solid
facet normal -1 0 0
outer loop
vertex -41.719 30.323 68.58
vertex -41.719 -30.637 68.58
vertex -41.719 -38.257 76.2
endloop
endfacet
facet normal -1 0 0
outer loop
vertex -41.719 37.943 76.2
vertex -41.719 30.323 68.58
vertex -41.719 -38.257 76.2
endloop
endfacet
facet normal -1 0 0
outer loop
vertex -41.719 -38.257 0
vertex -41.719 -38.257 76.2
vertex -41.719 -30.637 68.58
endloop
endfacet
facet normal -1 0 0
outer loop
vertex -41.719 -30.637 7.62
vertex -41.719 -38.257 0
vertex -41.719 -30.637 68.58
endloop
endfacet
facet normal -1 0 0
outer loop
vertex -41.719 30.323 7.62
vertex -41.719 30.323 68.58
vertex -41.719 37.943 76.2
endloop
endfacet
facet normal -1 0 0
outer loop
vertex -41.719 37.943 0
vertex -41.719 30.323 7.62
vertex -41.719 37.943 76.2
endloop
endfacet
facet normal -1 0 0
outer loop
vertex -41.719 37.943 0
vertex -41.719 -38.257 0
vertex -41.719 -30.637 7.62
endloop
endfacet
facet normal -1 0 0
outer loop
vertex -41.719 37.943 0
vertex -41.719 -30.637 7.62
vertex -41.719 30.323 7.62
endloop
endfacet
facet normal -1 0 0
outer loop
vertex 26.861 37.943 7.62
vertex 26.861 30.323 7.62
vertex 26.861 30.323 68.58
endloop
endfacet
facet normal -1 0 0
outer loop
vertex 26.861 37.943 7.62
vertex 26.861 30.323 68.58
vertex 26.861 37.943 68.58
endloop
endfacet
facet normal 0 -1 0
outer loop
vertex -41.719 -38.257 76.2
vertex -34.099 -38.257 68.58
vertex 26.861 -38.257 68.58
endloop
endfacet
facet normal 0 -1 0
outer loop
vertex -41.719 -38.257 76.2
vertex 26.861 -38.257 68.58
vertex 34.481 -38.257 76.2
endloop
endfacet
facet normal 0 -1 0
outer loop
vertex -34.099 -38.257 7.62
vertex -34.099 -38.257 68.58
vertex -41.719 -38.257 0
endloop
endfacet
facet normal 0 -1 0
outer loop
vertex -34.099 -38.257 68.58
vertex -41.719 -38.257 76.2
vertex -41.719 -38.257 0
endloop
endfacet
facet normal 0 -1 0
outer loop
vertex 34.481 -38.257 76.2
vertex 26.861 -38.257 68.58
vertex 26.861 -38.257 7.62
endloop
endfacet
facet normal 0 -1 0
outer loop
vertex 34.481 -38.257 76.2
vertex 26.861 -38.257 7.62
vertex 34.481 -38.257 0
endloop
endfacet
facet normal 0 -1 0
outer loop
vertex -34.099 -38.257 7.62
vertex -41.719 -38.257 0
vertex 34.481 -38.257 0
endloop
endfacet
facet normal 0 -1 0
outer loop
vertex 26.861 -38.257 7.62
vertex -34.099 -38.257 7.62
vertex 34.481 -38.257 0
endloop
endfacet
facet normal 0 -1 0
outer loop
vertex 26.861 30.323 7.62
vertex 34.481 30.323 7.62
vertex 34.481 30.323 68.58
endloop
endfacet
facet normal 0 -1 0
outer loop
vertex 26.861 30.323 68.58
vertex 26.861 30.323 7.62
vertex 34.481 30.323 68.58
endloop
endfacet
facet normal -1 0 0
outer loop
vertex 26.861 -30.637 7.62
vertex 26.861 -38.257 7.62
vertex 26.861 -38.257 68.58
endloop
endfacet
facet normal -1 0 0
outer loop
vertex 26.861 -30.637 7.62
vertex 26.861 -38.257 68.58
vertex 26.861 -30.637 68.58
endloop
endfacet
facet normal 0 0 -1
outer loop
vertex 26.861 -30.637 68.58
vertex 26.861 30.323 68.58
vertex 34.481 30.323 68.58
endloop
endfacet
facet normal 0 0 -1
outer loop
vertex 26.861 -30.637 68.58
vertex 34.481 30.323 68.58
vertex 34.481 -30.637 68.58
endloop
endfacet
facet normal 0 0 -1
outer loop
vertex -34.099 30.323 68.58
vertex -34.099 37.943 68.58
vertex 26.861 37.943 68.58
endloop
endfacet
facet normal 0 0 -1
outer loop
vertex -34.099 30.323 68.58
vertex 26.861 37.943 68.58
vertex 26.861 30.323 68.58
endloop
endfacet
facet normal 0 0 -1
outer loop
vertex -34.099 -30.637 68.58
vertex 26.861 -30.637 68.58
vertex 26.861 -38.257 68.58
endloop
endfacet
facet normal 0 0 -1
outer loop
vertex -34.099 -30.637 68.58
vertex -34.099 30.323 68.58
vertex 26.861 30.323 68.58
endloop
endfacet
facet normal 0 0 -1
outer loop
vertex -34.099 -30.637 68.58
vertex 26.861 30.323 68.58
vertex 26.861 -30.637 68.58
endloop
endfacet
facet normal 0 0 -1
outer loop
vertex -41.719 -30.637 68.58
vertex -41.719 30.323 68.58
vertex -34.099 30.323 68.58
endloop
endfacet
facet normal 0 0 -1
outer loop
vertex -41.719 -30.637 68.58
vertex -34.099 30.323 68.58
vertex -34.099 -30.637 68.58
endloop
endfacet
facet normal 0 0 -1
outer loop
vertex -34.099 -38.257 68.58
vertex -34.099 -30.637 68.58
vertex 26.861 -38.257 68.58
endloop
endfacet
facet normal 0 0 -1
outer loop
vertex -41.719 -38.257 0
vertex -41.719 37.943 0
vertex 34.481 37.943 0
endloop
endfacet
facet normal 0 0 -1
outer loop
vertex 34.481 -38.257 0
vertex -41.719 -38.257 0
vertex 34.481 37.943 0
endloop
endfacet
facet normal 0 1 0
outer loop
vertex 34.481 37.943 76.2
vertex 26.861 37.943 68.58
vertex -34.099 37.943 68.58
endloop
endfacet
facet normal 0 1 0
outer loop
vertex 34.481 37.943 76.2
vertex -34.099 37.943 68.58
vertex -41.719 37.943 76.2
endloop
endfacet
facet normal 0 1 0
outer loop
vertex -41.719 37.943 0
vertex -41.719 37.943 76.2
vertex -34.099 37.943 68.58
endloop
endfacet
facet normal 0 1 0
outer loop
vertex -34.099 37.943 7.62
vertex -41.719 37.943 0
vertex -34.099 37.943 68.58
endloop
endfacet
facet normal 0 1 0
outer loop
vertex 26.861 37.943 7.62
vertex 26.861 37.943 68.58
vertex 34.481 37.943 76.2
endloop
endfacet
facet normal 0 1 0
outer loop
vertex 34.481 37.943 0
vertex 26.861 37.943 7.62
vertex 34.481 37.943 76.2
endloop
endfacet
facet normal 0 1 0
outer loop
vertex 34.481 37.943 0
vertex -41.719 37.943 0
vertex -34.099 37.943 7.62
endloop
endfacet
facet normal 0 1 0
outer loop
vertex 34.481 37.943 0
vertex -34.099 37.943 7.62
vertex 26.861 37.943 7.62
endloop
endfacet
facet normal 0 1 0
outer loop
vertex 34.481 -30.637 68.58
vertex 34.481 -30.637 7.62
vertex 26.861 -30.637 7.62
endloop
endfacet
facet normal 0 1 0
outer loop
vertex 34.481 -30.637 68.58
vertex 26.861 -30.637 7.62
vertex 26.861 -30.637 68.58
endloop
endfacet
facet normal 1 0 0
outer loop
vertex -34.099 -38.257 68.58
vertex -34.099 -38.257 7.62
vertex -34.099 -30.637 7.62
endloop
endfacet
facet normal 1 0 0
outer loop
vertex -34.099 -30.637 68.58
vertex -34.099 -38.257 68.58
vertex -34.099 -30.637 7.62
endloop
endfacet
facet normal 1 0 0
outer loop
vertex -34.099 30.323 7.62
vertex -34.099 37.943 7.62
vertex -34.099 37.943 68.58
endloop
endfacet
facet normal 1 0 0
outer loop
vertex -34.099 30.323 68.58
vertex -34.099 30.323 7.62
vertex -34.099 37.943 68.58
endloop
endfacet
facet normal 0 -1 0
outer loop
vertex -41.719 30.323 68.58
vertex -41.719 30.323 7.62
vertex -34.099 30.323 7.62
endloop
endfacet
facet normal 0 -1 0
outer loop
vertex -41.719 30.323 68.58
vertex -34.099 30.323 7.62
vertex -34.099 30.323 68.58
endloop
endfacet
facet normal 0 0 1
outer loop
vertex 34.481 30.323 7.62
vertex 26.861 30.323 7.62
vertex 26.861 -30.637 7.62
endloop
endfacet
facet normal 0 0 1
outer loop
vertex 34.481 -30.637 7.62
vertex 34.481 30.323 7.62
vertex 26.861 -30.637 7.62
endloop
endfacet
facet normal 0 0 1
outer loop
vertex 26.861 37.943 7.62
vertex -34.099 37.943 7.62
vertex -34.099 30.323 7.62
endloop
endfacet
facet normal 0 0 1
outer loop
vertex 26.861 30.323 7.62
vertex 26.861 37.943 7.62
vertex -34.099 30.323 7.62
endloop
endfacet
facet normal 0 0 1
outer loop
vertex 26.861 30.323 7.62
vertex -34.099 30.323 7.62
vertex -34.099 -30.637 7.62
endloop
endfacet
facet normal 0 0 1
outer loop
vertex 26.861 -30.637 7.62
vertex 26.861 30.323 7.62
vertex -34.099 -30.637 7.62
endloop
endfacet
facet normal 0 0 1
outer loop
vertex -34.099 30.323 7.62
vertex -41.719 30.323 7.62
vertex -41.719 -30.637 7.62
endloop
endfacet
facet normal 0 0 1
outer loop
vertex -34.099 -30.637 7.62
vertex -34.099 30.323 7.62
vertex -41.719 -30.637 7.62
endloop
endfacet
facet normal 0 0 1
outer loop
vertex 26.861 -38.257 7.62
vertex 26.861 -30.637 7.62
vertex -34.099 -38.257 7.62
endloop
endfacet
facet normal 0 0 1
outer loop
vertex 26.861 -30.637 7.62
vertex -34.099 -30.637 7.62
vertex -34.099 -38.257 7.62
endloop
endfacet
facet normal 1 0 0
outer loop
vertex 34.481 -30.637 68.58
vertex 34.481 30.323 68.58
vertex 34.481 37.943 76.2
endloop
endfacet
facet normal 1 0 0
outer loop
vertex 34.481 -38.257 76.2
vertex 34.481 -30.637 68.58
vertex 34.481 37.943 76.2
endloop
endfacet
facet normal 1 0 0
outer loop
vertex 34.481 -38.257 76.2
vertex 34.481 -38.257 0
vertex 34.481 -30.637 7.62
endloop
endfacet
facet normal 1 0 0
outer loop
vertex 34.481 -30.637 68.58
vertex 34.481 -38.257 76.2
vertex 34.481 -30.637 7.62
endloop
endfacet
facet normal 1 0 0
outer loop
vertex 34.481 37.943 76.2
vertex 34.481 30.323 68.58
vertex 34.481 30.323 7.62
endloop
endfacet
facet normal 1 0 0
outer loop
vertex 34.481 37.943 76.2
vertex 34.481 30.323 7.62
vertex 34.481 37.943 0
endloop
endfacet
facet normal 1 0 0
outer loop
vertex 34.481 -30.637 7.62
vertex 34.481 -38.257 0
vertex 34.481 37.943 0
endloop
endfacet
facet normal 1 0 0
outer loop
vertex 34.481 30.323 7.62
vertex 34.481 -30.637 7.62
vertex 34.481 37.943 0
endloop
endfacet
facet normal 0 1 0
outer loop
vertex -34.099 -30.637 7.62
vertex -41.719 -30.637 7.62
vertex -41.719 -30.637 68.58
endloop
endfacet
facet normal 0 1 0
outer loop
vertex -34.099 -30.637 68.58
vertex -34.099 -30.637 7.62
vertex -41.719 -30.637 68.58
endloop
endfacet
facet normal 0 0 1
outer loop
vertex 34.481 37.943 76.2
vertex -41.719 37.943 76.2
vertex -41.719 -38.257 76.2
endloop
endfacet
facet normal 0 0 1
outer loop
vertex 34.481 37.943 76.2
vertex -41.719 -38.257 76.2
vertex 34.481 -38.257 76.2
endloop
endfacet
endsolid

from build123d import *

# Parameters (mm, degrees)
F0_W     = 76.2
F0_H     = 76.2
F1_DEPTH = 76.2
F2_T     = -7.62
F3_W     = 60.96
F3_H     = 60.96
F4_DEPTH = 25.4
F5_W     = 60.96
F5_H     = 60.96
F6_DEPTH = 25.4
F7_W     = 60.96
F7_H     = 60.96
F8_DEPTH = 25.4


with BuildPart() as f1:
    # F0 (on Top) → F1 (new body)
    with BuildSketch(Plane.XY):
        with Locations((-3.61854, -0.157197)):
            Rectangle(F0_W, F0_H)
    extrude(amount=F1_DEPTH)

    # F2
    f2_openings = [f1.faces().sort_by_distance(p)[0] for p in [
        (-3.61854, -38.257197, 38.1),
    ]]
    offset(amount=F2_T, openings=f2_openings)

    # F3 (on face) → F4 (cut)
    with BuildSketch(Plane(origin=(-41.71854, 0, 0), x_dir=(0, -1, 0), z_dir=(-1, 0, 0))):
        with Locations((0.157197, 38.1)):
            Rectangle(F3_W, F3_H)
    extrude(amount=-F4_DEPTH, mode=Mode.SUBTRACT)

    # F5 (on face) → F6 (cut)
    with BuildSketch(Plane(origin=(0, 37.942803, 0), x_dir=(-1, 0, 0), z_dir=(0, 1, 0))):
        with Locations((3.61854, 38.1)):
            Rectangle(F5_W, F5_H)
    extrude(amount=-F6_DEPTH, mode=Mode.SUBTRACT)

    # F7 (on face) → F8 (cut)
    with BuildSketch(Plane.YZ.offset(34.48146)):
        with Locations((-0.157197, 38.1)):
            Rectangle(F7_W, F7_H)
    extrude(amount=-F8_DEPTH, mode=Mode.SUBTRACT)


solid = f1.part
